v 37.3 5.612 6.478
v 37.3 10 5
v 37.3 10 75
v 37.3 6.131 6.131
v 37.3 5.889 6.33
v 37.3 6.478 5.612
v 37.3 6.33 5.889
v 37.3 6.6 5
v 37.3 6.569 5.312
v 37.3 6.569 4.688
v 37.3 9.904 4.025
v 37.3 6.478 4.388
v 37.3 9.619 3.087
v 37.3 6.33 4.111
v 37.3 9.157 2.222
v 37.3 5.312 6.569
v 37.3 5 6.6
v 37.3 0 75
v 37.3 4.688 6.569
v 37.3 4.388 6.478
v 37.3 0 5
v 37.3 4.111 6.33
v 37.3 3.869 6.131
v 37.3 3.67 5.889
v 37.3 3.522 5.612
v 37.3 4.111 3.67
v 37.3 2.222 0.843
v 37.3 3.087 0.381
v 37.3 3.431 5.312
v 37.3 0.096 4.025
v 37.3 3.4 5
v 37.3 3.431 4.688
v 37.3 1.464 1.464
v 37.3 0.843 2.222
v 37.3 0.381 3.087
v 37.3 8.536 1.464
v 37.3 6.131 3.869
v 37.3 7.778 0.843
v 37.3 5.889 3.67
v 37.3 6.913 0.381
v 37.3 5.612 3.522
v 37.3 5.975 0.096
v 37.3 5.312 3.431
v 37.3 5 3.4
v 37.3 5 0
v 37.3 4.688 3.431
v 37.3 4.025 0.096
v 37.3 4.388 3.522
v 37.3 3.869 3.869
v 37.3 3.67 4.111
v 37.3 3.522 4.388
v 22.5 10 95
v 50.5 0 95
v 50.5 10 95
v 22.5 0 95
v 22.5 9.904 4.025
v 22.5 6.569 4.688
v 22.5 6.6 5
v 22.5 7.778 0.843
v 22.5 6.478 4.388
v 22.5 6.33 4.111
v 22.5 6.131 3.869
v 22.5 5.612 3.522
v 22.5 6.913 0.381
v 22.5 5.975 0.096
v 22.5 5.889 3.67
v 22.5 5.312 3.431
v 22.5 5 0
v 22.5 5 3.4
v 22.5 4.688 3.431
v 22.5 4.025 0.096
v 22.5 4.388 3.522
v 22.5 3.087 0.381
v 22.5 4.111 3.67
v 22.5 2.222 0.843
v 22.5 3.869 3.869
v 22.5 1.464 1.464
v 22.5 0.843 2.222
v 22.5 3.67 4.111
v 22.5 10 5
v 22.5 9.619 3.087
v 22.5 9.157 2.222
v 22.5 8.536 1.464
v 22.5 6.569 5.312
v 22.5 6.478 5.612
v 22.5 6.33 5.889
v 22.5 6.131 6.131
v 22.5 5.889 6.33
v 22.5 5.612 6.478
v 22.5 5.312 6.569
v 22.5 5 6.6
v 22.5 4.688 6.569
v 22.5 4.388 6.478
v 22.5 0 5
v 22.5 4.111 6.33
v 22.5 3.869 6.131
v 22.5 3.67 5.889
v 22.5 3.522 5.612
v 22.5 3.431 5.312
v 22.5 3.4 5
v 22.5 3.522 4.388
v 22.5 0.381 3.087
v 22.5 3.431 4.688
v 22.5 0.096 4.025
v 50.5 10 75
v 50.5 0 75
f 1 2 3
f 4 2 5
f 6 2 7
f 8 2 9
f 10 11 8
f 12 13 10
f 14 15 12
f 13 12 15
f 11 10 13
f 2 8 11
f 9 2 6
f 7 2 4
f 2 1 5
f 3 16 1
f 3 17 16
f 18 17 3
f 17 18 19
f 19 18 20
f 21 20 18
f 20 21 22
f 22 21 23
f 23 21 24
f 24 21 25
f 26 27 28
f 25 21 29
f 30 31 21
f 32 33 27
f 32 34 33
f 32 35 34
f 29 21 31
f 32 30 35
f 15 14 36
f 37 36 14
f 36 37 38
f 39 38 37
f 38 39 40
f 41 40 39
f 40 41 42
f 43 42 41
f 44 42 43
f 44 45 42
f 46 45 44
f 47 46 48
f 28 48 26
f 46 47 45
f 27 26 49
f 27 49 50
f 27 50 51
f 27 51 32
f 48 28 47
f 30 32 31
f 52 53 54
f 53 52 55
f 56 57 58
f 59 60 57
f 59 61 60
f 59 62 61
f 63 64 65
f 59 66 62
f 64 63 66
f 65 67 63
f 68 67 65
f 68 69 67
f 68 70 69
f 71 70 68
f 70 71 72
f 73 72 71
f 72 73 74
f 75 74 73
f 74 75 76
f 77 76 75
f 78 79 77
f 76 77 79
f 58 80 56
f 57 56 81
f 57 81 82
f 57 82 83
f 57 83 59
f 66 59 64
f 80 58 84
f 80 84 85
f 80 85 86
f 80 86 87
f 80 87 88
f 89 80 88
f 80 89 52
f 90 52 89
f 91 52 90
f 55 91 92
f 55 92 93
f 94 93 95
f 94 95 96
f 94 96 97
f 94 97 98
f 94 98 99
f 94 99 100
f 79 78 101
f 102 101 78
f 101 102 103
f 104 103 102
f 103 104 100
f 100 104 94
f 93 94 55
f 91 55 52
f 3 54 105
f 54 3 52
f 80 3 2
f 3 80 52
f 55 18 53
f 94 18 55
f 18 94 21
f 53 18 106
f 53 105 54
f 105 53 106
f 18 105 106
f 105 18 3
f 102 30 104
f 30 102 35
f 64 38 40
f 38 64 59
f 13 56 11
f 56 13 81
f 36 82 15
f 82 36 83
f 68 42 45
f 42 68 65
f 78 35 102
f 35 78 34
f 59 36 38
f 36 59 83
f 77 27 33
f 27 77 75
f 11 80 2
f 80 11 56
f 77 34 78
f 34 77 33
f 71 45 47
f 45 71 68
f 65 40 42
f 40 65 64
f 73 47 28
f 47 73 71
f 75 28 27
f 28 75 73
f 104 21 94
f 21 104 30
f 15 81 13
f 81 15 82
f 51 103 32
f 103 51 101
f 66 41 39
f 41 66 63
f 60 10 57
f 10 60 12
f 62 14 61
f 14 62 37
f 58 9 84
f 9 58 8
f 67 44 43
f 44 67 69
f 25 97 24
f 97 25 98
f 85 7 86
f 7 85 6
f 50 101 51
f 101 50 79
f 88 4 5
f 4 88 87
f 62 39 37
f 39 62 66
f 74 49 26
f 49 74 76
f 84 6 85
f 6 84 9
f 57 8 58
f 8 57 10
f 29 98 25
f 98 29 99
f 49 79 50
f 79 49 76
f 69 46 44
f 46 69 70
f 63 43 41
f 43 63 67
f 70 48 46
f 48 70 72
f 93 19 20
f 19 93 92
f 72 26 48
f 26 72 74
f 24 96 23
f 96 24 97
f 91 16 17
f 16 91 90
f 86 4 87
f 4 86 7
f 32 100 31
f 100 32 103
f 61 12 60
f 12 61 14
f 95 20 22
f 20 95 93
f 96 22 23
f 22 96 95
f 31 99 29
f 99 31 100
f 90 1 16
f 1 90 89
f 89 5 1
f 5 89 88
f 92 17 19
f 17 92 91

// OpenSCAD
tw = 60; // total width
sw = 10; // screw width
lw = 15; // lever width

td = 25; // total depth
sd = 10; // screw depth
th = 10;
lh = 90;

* difference() {
	cube( [ tw, td, th ] );
	translate([-0.1,-0.1,-0.1]) cube( [ sw+0.2, sd+0.2, th+0.2 ] );
	translate([tw-sw-0.1,-0.1,-0.1]) cube( [ sw+0.2, sd+0.2, th+0.2 ] );
	translate([(tw-lw)/2,-0.1,-0.1]) cube( [ lw+0.2, sd+0.2, th+0.2 ] );

	translate( [0,sd/2,sd/2] ) 
	rotate( 90, [0,1,0] )
	cylinder( r=1.6, h=tw, $fn=32 );

	translate( [sw/2,+td+0.1,th/2] ) 
	rotate( 90, [1,0,0] )
	cylinder( r=2.1, h=td, $fn=32 );

	translate( [tw-sw/2,+td+0.1,th/2] ) 
	rotate( 90, [1,0,0] )
	cylinder( r=2.1, h=td, $fn=32 );

}

difference() {
	translate([(tw-lw)/2,0,sd/2])
	union() {
		cube( [ lw-0.2, sd, lh ] );

		translate( [ 8, 0, lh-20 ] )
		cube( [ 20, sd, 20 ] );
	
		translate( [0,sd/2,0] )
		rotate( 90, [0,1,0] )
		cylinder( r=sd/2, h=lw-0.2, $fn=32 );
	}
	
	translate( [0,sd/2,sd/2] ) 
	rotate( 90, [0,1,0] )
	cylinder( r=1.6, h=tw, $fn=32 );
}
